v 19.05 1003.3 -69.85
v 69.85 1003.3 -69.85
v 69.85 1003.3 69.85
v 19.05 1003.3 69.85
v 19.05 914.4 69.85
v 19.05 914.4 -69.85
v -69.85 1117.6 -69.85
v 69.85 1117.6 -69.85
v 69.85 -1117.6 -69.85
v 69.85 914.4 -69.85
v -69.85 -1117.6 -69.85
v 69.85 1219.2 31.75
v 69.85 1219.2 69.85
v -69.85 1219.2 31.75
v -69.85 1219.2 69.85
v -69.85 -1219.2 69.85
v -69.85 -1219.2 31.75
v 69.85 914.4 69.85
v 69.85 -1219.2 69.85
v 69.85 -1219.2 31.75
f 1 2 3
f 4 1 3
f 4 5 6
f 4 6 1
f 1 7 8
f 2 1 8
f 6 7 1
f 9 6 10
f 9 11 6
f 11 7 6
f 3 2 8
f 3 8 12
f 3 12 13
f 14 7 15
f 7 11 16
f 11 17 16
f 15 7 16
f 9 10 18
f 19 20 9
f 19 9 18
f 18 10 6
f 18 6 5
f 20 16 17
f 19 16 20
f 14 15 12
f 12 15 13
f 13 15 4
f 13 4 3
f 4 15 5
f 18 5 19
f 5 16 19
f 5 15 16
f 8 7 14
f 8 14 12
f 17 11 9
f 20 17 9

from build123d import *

# Parameters (mm, degrees)
F0_W     = 139.7
F0_H     = 139.7
F1_DEPTH = 1219.2
F2_SIZE  = 101.6
F3_W     = 88.9
F3_H     = 139.7
F4_DEPTH = 50.8


with BuildPart() as f1:
    # F0 (on Front) → F1 (new body, symmetric)
    with BuildSketch(Plane.XZ):
        Rectangle(F0_W, F0_H)
    extrude(amount=F1_DEPTH, both=True)

    # F2
    f2_edges = [f1.edges().sort_by_distance(p)[0] for p in [
        (0, -1219.2, -69.85),
        (0, 1219.2, -69.85),
    ]]
    chamfer(f2_edges, length=F2_SIZE)

    # F3 (on face) → F4 (cut)
    with BuildSketch(Plane.YZ.offset(69.85)):
        with Locations((958.85, 0)):
            Rectangle(F3_W, F3_H)
    extrude(amount=-F4_DEPTH, mode=Mode.SUBTRACT)


solid = f1.part
